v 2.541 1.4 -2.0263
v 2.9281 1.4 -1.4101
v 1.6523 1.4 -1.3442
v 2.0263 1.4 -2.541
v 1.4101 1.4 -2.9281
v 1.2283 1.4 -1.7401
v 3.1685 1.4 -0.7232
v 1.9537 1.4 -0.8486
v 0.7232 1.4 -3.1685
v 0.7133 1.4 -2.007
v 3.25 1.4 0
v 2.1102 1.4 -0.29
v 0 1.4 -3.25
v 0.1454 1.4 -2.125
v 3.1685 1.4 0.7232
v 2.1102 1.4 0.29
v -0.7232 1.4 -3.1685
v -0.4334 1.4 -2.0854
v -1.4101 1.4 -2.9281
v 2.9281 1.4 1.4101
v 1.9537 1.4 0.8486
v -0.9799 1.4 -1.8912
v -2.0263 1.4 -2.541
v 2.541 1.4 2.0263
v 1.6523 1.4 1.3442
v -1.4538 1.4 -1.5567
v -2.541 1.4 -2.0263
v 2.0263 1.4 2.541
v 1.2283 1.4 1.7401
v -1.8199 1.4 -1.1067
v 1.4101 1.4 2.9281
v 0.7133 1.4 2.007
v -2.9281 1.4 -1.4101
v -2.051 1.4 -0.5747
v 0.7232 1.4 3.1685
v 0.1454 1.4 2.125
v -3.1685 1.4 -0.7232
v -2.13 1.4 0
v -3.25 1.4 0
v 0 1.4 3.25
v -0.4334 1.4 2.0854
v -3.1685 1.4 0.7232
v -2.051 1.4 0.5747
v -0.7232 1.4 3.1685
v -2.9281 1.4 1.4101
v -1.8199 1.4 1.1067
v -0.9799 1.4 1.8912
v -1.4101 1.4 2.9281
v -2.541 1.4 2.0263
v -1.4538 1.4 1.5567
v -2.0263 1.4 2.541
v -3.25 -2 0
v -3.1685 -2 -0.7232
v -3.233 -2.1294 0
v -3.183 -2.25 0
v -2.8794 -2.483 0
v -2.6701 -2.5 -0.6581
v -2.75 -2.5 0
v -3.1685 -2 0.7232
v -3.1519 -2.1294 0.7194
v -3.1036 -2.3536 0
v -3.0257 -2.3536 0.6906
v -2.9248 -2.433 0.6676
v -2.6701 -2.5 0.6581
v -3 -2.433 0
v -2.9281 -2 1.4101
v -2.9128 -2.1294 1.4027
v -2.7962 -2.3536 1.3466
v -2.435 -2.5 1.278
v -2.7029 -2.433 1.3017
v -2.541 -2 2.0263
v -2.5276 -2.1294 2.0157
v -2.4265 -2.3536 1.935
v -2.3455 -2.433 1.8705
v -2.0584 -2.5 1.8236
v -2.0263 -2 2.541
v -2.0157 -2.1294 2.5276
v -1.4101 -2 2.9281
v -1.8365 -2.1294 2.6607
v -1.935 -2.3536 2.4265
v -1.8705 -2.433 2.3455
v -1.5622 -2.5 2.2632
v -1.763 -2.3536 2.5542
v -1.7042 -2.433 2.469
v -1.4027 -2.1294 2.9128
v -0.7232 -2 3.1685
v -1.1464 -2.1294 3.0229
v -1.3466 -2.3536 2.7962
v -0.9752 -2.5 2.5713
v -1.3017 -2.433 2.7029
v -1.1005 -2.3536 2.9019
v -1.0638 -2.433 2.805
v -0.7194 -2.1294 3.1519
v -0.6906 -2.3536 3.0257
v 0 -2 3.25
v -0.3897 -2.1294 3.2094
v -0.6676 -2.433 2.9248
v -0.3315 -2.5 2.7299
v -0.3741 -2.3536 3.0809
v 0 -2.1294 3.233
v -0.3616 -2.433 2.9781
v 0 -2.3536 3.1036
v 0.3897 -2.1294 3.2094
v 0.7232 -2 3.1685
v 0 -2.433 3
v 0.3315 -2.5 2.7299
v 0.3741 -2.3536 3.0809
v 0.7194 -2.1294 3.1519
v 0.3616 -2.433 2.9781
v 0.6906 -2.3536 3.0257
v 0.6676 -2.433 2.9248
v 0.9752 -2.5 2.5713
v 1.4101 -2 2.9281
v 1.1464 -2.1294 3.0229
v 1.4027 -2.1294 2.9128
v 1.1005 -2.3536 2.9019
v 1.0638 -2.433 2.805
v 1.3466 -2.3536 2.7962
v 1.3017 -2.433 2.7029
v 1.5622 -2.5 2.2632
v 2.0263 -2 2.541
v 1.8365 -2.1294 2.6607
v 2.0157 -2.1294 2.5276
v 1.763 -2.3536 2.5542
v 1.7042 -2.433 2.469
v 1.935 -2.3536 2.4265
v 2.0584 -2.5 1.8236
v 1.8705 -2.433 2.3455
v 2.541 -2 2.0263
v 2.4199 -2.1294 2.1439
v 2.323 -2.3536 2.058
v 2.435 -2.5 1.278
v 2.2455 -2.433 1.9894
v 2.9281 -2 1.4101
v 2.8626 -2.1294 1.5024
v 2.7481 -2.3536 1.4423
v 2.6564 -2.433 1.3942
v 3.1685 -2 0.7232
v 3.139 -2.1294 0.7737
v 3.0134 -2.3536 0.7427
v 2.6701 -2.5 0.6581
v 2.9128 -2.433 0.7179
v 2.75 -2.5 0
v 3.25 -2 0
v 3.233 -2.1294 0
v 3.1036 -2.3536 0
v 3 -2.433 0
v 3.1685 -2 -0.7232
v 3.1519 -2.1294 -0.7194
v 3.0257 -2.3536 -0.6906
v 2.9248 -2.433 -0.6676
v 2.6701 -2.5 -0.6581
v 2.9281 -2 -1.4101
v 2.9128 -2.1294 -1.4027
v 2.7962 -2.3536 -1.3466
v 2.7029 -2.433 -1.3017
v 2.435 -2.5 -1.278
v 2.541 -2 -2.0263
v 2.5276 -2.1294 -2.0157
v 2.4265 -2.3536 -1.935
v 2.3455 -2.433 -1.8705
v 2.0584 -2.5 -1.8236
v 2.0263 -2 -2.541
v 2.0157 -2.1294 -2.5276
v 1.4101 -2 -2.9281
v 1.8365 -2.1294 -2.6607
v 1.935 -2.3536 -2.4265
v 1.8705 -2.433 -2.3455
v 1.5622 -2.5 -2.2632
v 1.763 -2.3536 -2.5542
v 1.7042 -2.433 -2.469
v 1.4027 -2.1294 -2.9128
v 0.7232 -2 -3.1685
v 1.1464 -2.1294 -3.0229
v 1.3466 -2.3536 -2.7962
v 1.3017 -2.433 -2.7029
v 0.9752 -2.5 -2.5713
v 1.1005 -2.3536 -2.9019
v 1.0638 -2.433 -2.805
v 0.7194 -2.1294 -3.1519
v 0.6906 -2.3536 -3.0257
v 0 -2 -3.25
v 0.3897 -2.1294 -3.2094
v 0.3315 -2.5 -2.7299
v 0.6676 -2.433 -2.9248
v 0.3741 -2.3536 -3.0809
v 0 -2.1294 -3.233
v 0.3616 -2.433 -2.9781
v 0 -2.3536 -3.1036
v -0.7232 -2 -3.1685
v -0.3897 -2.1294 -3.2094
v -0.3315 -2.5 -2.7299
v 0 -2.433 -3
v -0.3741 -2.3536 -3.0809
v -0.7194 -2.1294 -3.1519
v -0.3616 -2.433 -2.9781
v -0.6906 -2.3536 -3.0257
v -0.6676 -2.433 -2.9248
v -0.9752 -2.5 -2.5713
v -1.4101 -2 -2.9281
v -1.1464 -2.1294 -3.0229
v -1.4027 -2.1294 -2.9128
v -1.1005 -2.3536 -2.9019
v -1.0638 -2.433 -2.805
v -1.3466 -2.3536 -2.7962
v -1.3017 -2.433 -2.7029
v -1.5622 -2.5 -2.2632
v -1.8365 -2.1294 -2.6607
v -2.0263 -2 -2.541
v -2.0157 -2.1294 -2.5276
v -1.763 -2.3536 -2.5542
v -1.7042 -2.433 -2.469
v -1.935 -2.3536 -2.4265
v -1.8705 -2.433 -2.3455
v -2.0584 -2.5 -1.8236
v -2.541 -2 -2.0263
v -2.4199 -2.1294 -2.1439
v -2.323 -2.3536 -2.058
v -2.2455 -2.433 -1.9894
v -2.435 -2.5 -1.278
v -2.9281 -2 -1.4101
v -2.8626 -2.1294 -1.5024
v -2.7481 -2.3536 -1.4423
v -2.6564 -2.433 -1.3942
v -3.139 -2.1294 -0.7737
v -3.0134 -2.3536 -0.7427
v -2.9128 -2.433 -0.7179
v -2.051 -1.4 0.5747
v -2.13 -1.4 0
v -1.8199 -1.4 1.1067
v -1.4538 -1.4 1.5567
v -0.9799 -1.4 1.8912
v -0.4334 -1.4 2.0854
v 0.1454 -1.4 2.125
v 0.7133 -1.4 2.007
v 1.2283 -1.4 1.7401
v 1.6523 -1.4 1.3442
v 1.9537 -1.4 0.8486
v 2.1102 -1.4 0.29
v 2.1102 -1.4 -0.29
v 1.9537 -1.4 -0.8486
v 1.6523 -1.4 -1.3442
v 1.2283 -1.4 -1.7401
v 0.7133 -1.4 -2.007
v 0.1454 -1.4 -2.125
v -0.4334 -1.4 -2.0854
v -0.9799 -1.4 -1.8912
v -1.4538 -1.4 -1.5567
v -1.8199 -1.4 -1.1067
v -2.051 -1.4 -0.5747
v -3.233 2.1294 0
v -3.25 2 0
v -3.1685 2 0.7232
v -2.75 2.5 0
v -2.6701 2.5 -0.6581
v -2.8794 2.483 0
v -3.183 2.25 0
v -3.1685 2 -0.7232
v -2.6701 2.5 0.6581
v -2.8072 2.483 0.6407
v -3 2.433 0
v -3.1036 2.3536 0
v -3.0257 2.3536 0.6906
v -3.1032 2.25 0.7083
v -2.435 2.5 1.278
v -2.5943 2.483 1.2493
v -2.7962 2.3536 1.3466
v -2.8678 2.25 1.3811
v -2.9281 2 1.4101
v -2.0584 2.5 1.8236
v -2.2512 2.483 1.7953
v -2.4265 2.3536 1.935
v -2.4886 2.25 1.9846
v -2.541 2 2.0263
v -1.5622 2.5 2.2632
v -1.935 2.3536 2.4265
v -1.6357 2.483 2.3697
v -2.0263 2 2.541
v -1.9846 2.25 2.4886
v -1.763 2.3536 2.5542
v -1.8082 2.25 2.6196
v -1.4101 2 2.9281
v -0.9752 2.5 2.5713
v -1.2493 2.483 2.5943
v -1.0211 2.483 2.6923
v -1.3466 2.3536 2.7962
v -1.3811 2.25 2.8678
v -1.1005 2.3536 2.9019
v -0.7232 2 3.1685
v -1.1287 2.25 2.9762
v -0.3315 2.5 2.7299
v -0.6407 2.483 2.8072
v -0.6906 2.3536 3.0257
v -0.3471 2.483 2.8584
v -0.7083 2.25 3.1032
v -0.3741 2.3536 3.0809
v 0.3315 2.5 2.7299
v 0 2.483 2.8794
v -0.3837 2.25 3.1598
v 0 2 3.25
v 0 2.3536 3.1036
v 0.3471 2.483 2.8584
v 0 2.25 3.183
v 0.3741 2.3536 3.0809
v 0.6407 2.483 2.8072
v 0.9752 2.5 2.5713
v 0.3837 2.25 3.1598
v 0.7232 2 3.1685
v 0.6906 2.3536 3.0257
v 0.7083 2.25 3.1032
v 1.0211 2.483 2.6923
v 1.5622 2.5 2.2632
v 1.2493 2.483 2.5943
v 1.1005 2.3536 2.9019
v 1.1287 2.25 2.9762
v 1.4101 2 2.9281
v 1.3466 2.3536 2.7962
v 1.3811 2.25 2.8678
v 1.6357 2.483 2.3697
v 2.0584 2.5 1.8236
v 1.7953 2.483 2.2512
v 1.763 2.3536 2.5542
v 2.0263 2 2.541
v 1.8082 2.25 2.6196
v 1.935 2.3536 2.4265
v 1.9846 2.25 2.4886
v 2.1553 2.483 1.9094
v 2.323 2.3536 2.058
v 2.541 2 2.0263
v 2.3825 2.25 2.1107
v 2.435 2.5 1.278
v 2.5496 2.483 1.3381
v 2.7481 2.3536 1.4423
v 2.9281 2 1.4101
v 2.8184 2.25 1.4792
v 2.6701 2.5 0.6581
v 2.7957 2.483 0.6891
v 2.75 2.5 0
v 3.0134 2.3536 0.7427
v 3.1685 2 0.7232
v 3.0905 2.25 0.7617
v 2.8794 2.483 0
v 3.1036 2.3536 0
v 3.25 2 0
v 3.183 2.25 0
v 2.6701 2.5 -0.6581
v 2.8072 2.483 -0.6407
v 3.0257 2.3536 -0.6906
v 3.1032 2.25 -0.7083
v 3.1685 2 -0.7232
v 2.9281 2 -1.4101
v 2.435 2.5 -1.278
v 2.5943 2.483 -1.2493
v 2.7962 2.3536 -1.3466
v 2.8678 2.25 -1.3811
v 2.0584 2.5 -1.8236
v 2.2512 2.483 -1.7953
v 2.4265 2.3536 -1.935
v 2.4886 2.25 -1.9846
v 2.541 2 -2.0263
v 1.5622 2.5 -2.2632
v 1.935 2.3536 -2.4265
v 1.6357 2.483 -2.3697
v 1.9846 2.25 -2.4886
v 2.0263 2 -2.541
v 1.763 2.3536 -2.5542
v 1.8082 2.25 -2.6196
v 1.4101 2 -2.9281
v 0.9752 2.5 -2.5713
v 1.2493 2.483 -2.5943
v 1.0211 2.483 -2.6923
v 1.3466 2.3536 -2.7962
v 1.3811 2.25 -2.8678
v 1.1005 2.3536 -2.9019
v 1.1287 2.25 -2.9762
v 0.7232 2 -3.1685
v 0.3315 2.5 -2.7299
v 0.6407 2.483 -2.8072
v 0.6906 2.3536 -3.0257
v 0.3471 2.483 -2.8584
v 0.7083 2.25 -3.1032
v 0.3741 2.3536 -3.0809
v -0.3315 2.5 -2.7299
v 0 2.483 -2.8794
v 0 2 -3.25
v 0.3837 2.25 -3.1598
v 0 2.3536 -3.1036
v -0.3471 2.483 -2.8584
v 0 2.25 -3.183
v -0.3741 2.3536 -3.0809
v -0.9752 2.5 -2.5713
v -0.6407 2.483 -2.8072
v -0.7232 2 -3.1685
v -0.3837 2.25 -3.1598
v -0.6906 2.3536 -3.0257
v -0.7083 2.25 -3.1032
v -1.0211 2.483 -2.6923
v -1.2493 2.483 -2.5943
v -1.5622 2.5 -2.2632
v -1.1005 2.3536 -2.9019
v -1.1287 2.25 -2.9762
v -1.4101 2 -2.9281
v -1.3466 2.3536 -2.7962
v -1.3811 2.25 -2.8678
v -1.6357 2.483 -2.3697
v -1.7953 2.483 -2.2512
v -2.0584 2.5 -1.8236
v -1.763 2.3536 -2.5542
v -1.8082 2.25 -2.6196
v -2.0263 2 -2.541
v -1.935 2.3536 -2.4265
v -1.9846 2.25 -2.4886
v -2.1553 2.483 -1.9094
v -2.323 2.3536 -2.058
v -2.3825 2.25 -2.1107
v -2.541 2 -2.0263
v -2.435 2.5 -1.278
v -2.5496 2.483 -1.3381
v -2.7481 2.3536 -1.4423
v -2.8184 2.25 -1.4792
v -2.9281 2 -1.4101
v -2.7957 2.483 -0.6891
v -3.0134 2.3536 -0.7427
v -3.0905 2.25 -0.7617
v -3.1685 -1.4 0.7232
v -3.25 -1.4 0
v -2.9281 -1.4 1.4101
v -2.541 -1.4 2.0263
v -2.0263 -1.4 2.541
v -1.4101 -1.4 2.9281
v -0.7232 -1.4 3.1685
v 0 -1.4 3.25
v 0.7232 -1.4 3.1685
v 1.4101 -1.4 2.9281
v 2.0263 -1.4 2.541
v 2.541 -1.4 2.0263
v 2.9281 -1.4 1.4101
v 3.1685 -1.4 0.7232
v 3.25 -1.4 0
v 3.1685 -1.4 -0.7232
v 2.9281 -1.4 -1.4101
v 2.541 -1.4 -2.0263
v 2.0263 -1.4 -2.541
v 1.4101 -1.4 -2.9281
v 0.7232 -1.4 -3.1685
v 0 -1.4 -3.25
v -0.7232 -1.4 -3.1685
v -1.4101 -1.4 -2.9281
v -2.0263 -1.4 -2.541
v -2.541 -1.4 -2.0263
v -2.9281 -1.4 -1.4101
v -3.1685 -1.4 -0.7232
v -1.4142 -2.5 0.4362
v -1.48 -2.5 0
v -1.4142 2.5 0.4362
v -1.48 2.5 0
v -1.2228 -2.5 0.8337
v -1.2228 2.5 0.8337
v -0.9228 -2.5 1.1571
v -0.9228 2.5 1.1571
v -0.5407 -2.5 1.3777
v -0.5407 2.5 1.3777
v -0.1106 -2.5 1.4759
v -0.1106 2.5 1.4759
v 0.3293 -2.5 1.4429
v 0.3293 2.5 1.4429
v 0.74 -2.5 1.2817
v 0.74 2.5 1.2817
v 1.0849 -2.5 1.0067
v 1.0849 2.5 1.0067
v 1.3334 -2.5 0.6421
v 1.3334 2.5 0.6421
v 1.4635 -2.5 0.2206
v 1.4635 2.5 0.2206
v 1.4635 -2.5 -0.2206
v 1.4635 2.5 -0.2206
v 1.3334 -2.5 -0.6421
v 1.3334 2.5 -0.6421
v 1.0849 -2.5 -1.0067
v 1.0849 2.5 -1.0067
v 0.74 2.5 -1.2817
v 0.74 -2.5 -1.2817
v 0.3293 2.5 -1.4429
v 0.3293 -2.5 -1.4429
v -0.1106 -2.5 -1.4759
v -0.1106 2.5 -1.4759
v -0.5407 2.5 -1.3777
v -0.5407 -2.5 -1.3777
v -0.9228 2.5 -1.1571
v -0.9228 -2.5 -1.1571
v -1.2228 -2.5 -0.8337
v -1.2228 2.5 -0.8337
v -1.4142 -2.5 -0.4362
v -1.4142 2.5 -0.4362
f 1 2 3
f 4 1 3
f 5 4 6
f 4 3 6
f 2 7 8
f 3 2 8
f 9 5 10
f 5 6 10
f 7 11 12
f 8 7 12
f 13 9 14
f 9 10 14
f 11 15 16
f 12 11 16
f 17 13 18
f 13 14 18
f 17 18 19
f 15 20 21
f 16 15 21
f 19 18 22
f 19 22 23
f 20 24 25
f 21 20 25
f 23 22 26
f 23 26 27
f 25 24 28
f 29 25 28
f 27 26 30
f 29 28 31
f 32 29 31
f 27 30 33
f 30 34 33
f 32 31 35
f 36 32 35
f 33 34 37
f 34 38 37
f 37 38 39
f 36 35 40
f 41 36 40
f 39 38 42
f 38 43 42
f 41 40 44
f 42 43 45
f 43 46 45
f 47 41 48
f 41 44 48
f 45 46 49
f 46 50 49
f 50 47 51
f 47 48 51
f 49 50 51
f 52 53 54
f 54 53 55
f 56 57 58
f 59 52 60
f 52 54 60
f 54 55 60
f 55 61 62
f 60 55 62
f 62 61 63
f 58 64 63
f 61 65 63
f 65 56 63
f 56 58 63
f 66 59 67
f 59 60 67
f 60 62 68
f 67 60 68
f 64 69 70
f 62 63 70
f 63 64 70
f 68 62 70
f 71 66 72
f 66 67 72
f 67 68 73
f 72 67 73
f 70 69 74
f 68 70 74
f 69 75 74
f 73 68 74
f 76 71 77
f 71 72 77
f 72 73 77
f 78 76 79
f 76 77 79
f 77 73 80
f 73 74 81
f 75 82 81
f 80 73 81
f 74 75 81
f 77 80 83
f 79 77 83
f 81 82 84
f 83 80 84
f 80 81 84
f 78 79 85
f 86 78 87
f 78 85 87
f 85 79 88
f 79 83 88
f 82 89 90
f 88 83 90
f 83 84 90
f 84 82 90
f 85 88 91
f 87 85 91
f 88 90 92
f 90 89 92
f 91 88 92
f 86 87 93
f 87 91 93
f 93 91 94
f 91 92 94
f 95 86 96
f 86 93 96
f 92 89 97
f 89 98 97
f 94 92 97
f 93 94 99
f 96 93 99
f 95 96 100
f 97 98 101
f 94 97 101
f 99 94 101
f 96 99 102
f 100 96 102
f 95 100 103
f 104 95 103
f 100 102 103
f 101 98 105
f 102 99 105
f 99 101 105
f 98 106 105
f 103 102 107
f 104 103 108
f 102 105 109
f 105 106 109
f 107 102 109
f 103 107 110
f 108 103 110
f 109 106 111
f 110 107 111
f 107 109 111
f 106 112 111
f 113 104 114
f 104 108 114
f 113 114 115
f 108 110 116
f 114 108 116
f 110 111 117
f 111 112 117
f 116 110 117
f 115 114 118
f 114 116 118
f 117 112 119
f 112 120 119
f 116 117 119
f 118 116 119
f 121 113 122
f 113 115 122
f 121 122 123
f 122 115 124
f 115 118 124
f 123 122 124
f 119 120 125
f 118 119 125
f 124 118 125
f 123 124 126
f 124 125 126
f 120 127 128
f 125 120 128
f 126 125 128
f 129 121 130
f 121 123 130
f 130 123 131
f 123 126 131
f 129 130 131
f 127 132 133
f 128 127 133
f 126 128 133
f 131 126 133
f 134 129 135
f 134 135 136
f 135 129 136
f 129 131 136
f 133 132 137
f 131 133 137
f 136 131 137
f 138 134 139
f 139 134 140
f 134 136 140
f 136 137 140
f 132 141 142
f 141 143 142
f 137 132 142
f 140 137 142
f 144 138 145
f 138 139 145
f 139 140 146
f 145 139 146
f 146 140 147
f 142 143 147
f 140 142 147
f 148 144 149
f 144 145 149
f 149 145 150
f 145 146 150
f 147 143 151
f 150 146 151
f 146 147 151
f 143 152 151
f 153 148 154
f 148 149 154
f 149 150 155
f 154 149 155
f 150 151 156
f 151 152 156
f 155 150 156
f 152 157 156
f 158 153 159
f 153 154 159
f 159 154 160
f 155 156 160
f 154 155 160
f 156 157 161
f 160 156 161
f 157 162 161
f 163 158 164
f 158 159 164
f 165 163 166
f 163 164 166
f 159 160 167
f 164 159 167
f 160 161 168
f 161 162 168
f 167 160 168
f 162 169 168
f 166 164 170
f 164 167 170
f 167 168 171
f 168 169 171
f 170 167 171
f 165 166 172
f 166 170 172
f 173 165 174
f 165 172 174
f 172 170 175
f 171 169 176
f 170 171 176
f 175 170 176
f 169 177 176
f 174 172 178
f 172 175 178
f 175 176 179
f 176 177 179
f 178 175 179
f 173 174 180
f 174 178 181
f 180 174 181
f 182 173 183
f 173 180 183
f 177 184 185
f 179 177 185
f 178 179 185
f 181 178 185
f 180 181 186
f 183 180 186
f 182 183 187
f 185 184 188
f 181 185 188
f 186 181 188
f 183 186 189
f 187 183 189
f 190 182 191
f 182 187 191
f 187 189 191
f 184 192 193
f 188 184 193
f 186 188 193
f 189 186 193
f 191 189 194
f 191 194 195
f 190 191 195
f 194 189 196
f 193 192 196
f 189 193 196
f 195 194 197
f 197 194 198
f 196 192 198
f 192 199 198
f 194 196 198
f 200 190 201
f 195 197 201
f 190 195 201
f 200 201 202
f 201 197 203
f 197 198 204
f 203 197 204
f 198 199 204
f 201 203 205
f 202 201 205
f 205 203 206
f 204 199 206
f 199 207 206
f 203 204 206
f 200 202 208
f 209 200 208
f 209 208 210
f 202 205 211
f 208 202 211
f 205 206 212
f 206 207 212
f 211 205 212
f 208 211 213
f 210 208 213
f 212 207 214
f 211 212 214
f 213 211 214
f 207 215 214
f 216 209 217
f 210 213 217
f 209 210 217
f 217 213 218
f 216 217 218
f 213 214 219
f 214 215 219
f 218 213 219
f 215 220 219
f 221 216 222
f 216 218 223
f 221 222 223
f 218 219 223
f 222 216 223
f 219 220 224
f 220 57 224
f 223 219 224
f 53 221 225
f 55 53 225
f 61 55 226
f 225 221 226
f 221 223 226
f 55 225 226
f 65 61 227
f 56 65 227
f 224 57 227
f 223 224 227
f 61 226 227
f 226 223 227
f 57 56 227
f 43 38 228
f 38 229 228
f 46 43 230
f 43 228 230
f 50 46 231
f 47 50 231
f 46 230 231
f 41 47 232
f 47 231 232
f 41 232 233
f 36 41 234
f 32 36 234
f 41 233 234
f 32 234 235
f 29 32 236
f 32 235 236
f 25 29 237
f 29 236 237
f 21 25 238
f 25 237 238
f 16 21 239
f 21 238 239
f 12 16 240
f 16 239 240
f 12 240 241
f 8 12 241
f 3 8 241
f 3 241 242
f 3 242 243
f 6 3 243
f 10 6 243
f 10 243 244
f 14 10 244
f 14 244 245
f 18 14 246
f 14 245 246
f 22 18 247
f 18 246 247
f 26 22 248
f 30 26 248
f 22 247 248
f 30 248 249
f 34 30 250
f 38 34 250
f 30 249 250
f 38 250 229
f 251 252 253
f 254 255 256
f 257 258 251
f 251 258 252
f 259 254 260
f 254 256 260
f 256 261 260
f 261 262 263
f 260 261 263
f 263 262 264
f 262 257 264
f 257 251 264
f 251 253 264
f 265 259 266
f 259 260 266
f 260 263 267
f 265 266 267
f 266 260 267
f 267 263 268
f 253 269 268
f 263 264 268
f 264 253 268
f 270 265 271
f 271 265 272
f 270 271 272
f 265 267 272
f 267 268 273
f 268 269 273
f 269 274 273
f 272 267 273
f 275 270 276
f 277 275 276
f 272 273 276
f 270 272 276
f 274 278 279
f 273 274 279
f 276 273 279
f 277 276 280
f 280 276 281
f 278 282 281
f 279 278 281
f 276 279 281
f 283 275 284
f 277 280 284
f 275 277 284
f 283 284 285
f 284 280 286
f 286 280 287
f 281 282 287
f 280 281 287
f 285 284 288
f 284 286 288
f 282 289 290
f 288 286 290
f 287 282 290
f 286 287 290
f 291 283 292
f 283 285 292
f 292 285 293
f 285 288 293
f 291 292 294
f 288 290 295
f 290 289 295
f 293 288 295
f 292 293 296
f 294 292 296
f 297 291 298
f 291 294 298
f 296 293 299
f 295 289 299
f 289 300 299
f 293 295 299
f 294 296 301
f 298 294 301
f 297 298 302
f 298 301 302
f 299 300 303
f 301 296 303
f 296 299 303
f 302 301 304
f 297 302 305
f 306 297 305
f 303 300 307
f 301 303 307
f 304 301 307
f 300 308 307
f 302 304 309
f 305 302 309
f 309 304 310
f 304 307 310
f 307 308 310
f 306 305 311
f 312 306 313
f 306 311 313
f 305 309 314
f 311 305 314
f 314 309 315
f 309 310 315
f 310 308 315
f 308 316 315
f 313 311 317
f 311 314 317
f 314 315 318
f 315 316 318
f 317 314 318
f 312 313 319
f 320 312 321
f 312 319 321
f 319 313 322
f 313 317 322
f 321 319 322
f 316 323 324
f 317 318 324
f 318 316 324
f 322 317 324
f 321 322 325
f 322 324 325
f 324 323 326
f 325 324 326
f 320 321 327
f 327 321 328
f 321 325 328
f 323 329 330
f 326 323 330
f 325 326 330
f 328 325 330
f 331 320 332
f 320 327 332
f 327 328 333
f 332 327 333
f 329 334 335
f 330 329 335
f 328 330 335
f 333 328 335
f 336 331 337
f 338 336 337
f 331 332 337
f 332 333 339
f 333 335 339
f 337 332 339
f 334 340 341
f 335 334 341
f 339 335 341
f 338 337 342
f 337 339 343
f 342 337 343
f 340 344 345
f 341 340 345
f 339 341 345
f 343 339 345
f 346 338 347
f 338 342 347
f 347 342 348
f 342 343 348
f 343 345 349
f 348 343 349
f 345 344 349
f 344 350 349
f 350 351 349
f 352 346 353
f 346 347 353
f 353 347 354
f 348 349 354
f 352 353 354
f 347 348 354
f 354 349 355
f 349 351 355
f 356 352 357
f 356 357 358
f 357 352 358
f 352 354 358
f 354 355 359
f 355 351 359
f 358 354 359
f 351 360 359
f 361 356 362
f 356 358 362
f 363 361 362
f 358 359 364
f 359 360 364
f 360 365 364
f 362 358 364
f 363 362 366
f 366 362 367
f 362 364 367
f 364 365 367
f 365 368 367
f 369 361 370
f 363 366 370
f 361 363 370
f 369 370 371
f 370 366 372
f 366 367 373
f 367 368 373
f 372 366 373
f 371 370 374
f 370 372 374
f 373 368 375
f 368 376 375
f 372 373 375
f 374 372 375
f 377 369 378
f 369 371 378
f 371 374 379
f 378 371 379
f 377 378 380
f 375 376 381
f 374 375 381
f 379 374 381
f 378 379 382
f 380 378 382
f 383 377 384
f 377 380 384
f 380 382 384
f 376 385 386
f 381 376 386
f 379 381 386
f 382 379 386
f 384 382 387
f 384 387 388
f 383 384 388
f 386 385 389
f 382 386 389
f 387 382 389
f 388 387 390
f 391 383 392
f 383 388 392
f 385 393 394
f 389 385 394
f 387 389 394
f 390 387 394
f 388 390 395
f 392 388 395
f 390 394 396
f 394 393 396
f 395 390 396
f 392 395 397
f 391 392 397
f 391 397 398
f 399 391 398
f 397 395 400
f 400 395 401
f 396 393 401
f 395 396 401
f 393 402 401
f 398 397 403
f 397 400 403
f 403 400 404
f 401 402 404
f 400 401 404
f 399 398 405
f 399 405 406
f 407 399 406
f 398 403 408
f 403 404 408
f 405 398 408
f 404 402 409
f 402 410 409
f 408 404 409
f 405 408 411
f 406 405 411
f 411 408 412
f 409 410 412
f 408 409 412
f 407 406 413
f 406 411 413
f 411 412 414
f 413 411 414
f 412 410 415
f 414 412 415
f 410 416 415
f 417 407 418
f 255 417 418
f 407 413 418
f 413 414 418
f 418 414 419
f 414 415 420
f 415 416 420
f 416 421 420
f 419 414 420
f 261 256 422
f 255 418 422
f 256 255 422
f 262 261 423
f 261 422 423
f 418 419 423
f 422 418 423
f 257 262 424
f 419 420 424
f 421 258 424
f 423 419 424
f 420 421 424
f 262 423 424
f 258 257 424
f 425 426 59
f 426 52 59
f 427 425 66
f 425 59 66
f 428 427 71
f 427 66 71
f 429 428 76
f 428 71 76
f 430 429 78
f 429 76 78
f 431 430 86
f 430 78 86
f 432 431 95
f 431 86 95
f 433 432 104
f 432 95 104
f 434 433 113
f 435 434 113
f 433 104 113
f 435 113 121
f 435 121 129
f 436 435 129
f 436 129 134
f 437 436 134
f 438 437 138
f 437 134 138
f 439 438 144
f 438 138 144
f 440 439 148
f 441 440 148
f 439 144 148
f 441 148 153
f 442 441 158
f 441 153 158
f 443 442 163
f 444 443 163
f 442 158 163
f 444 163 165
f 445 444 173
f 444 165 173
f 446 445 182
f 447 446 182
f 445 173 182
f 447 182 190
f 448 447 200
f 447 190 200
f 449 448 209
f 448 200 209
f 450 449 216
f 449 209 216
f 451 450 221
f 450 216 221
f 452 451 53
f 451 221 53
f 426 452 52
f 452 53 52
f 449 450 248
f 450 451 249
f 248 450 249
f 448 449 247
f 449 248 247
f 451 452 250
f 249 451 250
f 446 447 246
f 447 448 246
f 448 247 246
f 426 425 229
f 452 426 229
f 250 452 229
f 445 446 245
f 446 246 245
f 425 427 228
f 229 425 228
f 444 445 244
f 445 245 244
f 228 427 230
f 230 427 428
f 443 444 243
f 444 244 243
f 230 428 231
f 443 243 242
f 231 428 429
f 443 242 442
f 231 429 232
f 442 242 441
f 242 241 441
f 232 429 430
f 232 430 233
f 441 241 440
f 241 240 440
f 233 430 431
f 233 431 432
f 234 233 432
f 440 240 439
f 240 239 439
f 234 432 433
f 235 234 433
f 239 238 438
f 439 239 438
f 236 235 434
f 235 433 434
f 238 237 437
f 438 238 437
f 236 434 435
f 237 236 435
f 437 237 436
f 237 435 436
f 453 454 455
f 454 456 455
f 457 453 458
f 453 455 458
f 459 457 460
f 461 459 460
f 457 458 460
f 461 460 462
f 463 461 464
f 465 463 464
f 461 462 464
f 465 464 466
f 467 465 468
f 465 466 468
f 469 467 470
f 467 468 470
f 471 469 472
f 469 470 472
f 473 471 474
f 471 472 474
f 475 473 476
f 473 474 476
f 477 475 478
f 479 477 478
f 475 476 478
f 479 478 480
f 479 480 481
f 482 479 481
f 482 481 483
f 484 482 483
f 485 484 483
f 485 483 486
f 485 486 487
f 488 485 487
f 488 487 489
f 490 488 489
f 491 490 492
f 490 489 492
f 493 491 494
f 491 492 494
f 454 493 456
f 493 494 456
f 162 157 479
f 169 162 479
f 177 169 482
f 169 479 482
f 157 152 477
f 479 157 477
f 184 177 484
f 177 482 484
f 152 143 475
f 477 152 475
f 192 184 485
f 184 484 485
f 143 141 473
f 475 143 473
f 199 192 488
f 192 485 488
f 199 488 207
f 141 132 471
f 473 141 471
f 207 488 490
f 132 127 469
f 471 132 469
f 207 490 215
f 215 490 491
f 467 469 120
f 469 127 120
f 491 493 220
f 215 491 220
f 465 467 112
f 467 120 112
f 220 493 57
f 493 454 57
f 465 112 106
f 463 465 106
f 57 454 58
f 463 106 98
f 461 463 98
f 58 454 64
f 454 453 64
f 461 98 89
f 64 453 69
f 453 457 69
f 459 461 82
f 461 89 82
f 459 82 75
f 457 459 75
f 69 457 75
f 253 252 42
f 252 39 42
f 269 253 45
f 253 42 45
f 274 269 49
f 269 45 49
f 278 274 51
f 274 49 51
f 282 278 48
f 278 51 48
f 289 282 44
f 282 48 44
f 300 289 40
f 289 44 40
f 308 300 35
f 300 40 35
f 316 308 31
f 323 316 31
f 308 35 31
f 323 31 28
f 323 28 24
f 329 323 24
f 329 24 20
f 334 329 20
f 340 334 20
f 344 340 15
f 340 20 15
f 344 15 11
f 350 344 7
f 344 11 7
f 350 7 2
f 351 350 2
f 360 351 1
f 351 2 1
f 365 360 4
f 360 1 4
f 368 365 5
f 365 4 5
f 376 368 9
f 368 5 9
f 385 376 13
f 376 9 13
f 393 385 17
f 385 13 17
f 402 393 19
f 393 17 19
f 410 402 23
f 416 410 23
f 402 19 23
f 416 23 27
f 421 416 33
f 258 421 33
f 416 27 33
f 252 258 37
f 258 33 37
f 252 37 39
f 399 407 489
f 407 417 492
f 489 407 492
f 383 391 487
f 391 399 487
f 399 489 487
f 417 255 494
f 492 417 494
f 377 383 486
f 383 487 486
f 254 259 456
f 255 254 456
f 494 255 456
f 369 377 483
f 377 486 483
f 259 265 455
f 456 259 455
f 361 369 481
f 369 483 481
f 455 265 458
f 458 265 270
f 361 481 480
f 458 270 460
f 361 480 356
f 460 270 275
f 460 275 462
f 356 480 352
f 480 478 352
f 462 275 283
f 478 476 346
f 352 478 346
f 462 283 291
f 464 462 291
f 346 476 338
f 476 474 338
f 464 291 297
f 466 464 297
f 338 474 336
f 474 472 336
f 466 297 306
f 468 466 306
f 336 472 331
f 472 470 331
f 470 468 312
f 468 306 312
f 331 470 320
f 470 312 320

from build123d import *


with BuildPart() as part:
    # Esquisse1 → Révolution1 (revolve)
    with BuildSketch(Plane.XY):
        with BuildLine():
            Line((-3.25, -1.4), (-3.25, -2))
            ThreePointArc((-3.25, -2), (-3.103553391, -2.353553391), (-2.75, -2.5))
            Line((-2.75, -2.5), (-1.48, -2.5))
            Line((-1.48, -2.5), (-1.48, 2.5))
            Line((-1.48, 2.5), (-2.75, 2.5))
            ThreePointArc((-2.75, 2.5), (-3.103553391, 2.353553391), (-3.25, 2))
            Line((-3.25, 2), (-3.25, 1.4))
            Line((-3.25, 1.4), (-2.13, 1.4))
            Line((-2.13, 1.4), (-2.13, -1.4))
            Line((-2.13, -1.4), (-3.25, -1.4))
        make_face()
    revolve(axis=Axis((0, 0, 0), (0, 1, 0)))


solid = part.part
